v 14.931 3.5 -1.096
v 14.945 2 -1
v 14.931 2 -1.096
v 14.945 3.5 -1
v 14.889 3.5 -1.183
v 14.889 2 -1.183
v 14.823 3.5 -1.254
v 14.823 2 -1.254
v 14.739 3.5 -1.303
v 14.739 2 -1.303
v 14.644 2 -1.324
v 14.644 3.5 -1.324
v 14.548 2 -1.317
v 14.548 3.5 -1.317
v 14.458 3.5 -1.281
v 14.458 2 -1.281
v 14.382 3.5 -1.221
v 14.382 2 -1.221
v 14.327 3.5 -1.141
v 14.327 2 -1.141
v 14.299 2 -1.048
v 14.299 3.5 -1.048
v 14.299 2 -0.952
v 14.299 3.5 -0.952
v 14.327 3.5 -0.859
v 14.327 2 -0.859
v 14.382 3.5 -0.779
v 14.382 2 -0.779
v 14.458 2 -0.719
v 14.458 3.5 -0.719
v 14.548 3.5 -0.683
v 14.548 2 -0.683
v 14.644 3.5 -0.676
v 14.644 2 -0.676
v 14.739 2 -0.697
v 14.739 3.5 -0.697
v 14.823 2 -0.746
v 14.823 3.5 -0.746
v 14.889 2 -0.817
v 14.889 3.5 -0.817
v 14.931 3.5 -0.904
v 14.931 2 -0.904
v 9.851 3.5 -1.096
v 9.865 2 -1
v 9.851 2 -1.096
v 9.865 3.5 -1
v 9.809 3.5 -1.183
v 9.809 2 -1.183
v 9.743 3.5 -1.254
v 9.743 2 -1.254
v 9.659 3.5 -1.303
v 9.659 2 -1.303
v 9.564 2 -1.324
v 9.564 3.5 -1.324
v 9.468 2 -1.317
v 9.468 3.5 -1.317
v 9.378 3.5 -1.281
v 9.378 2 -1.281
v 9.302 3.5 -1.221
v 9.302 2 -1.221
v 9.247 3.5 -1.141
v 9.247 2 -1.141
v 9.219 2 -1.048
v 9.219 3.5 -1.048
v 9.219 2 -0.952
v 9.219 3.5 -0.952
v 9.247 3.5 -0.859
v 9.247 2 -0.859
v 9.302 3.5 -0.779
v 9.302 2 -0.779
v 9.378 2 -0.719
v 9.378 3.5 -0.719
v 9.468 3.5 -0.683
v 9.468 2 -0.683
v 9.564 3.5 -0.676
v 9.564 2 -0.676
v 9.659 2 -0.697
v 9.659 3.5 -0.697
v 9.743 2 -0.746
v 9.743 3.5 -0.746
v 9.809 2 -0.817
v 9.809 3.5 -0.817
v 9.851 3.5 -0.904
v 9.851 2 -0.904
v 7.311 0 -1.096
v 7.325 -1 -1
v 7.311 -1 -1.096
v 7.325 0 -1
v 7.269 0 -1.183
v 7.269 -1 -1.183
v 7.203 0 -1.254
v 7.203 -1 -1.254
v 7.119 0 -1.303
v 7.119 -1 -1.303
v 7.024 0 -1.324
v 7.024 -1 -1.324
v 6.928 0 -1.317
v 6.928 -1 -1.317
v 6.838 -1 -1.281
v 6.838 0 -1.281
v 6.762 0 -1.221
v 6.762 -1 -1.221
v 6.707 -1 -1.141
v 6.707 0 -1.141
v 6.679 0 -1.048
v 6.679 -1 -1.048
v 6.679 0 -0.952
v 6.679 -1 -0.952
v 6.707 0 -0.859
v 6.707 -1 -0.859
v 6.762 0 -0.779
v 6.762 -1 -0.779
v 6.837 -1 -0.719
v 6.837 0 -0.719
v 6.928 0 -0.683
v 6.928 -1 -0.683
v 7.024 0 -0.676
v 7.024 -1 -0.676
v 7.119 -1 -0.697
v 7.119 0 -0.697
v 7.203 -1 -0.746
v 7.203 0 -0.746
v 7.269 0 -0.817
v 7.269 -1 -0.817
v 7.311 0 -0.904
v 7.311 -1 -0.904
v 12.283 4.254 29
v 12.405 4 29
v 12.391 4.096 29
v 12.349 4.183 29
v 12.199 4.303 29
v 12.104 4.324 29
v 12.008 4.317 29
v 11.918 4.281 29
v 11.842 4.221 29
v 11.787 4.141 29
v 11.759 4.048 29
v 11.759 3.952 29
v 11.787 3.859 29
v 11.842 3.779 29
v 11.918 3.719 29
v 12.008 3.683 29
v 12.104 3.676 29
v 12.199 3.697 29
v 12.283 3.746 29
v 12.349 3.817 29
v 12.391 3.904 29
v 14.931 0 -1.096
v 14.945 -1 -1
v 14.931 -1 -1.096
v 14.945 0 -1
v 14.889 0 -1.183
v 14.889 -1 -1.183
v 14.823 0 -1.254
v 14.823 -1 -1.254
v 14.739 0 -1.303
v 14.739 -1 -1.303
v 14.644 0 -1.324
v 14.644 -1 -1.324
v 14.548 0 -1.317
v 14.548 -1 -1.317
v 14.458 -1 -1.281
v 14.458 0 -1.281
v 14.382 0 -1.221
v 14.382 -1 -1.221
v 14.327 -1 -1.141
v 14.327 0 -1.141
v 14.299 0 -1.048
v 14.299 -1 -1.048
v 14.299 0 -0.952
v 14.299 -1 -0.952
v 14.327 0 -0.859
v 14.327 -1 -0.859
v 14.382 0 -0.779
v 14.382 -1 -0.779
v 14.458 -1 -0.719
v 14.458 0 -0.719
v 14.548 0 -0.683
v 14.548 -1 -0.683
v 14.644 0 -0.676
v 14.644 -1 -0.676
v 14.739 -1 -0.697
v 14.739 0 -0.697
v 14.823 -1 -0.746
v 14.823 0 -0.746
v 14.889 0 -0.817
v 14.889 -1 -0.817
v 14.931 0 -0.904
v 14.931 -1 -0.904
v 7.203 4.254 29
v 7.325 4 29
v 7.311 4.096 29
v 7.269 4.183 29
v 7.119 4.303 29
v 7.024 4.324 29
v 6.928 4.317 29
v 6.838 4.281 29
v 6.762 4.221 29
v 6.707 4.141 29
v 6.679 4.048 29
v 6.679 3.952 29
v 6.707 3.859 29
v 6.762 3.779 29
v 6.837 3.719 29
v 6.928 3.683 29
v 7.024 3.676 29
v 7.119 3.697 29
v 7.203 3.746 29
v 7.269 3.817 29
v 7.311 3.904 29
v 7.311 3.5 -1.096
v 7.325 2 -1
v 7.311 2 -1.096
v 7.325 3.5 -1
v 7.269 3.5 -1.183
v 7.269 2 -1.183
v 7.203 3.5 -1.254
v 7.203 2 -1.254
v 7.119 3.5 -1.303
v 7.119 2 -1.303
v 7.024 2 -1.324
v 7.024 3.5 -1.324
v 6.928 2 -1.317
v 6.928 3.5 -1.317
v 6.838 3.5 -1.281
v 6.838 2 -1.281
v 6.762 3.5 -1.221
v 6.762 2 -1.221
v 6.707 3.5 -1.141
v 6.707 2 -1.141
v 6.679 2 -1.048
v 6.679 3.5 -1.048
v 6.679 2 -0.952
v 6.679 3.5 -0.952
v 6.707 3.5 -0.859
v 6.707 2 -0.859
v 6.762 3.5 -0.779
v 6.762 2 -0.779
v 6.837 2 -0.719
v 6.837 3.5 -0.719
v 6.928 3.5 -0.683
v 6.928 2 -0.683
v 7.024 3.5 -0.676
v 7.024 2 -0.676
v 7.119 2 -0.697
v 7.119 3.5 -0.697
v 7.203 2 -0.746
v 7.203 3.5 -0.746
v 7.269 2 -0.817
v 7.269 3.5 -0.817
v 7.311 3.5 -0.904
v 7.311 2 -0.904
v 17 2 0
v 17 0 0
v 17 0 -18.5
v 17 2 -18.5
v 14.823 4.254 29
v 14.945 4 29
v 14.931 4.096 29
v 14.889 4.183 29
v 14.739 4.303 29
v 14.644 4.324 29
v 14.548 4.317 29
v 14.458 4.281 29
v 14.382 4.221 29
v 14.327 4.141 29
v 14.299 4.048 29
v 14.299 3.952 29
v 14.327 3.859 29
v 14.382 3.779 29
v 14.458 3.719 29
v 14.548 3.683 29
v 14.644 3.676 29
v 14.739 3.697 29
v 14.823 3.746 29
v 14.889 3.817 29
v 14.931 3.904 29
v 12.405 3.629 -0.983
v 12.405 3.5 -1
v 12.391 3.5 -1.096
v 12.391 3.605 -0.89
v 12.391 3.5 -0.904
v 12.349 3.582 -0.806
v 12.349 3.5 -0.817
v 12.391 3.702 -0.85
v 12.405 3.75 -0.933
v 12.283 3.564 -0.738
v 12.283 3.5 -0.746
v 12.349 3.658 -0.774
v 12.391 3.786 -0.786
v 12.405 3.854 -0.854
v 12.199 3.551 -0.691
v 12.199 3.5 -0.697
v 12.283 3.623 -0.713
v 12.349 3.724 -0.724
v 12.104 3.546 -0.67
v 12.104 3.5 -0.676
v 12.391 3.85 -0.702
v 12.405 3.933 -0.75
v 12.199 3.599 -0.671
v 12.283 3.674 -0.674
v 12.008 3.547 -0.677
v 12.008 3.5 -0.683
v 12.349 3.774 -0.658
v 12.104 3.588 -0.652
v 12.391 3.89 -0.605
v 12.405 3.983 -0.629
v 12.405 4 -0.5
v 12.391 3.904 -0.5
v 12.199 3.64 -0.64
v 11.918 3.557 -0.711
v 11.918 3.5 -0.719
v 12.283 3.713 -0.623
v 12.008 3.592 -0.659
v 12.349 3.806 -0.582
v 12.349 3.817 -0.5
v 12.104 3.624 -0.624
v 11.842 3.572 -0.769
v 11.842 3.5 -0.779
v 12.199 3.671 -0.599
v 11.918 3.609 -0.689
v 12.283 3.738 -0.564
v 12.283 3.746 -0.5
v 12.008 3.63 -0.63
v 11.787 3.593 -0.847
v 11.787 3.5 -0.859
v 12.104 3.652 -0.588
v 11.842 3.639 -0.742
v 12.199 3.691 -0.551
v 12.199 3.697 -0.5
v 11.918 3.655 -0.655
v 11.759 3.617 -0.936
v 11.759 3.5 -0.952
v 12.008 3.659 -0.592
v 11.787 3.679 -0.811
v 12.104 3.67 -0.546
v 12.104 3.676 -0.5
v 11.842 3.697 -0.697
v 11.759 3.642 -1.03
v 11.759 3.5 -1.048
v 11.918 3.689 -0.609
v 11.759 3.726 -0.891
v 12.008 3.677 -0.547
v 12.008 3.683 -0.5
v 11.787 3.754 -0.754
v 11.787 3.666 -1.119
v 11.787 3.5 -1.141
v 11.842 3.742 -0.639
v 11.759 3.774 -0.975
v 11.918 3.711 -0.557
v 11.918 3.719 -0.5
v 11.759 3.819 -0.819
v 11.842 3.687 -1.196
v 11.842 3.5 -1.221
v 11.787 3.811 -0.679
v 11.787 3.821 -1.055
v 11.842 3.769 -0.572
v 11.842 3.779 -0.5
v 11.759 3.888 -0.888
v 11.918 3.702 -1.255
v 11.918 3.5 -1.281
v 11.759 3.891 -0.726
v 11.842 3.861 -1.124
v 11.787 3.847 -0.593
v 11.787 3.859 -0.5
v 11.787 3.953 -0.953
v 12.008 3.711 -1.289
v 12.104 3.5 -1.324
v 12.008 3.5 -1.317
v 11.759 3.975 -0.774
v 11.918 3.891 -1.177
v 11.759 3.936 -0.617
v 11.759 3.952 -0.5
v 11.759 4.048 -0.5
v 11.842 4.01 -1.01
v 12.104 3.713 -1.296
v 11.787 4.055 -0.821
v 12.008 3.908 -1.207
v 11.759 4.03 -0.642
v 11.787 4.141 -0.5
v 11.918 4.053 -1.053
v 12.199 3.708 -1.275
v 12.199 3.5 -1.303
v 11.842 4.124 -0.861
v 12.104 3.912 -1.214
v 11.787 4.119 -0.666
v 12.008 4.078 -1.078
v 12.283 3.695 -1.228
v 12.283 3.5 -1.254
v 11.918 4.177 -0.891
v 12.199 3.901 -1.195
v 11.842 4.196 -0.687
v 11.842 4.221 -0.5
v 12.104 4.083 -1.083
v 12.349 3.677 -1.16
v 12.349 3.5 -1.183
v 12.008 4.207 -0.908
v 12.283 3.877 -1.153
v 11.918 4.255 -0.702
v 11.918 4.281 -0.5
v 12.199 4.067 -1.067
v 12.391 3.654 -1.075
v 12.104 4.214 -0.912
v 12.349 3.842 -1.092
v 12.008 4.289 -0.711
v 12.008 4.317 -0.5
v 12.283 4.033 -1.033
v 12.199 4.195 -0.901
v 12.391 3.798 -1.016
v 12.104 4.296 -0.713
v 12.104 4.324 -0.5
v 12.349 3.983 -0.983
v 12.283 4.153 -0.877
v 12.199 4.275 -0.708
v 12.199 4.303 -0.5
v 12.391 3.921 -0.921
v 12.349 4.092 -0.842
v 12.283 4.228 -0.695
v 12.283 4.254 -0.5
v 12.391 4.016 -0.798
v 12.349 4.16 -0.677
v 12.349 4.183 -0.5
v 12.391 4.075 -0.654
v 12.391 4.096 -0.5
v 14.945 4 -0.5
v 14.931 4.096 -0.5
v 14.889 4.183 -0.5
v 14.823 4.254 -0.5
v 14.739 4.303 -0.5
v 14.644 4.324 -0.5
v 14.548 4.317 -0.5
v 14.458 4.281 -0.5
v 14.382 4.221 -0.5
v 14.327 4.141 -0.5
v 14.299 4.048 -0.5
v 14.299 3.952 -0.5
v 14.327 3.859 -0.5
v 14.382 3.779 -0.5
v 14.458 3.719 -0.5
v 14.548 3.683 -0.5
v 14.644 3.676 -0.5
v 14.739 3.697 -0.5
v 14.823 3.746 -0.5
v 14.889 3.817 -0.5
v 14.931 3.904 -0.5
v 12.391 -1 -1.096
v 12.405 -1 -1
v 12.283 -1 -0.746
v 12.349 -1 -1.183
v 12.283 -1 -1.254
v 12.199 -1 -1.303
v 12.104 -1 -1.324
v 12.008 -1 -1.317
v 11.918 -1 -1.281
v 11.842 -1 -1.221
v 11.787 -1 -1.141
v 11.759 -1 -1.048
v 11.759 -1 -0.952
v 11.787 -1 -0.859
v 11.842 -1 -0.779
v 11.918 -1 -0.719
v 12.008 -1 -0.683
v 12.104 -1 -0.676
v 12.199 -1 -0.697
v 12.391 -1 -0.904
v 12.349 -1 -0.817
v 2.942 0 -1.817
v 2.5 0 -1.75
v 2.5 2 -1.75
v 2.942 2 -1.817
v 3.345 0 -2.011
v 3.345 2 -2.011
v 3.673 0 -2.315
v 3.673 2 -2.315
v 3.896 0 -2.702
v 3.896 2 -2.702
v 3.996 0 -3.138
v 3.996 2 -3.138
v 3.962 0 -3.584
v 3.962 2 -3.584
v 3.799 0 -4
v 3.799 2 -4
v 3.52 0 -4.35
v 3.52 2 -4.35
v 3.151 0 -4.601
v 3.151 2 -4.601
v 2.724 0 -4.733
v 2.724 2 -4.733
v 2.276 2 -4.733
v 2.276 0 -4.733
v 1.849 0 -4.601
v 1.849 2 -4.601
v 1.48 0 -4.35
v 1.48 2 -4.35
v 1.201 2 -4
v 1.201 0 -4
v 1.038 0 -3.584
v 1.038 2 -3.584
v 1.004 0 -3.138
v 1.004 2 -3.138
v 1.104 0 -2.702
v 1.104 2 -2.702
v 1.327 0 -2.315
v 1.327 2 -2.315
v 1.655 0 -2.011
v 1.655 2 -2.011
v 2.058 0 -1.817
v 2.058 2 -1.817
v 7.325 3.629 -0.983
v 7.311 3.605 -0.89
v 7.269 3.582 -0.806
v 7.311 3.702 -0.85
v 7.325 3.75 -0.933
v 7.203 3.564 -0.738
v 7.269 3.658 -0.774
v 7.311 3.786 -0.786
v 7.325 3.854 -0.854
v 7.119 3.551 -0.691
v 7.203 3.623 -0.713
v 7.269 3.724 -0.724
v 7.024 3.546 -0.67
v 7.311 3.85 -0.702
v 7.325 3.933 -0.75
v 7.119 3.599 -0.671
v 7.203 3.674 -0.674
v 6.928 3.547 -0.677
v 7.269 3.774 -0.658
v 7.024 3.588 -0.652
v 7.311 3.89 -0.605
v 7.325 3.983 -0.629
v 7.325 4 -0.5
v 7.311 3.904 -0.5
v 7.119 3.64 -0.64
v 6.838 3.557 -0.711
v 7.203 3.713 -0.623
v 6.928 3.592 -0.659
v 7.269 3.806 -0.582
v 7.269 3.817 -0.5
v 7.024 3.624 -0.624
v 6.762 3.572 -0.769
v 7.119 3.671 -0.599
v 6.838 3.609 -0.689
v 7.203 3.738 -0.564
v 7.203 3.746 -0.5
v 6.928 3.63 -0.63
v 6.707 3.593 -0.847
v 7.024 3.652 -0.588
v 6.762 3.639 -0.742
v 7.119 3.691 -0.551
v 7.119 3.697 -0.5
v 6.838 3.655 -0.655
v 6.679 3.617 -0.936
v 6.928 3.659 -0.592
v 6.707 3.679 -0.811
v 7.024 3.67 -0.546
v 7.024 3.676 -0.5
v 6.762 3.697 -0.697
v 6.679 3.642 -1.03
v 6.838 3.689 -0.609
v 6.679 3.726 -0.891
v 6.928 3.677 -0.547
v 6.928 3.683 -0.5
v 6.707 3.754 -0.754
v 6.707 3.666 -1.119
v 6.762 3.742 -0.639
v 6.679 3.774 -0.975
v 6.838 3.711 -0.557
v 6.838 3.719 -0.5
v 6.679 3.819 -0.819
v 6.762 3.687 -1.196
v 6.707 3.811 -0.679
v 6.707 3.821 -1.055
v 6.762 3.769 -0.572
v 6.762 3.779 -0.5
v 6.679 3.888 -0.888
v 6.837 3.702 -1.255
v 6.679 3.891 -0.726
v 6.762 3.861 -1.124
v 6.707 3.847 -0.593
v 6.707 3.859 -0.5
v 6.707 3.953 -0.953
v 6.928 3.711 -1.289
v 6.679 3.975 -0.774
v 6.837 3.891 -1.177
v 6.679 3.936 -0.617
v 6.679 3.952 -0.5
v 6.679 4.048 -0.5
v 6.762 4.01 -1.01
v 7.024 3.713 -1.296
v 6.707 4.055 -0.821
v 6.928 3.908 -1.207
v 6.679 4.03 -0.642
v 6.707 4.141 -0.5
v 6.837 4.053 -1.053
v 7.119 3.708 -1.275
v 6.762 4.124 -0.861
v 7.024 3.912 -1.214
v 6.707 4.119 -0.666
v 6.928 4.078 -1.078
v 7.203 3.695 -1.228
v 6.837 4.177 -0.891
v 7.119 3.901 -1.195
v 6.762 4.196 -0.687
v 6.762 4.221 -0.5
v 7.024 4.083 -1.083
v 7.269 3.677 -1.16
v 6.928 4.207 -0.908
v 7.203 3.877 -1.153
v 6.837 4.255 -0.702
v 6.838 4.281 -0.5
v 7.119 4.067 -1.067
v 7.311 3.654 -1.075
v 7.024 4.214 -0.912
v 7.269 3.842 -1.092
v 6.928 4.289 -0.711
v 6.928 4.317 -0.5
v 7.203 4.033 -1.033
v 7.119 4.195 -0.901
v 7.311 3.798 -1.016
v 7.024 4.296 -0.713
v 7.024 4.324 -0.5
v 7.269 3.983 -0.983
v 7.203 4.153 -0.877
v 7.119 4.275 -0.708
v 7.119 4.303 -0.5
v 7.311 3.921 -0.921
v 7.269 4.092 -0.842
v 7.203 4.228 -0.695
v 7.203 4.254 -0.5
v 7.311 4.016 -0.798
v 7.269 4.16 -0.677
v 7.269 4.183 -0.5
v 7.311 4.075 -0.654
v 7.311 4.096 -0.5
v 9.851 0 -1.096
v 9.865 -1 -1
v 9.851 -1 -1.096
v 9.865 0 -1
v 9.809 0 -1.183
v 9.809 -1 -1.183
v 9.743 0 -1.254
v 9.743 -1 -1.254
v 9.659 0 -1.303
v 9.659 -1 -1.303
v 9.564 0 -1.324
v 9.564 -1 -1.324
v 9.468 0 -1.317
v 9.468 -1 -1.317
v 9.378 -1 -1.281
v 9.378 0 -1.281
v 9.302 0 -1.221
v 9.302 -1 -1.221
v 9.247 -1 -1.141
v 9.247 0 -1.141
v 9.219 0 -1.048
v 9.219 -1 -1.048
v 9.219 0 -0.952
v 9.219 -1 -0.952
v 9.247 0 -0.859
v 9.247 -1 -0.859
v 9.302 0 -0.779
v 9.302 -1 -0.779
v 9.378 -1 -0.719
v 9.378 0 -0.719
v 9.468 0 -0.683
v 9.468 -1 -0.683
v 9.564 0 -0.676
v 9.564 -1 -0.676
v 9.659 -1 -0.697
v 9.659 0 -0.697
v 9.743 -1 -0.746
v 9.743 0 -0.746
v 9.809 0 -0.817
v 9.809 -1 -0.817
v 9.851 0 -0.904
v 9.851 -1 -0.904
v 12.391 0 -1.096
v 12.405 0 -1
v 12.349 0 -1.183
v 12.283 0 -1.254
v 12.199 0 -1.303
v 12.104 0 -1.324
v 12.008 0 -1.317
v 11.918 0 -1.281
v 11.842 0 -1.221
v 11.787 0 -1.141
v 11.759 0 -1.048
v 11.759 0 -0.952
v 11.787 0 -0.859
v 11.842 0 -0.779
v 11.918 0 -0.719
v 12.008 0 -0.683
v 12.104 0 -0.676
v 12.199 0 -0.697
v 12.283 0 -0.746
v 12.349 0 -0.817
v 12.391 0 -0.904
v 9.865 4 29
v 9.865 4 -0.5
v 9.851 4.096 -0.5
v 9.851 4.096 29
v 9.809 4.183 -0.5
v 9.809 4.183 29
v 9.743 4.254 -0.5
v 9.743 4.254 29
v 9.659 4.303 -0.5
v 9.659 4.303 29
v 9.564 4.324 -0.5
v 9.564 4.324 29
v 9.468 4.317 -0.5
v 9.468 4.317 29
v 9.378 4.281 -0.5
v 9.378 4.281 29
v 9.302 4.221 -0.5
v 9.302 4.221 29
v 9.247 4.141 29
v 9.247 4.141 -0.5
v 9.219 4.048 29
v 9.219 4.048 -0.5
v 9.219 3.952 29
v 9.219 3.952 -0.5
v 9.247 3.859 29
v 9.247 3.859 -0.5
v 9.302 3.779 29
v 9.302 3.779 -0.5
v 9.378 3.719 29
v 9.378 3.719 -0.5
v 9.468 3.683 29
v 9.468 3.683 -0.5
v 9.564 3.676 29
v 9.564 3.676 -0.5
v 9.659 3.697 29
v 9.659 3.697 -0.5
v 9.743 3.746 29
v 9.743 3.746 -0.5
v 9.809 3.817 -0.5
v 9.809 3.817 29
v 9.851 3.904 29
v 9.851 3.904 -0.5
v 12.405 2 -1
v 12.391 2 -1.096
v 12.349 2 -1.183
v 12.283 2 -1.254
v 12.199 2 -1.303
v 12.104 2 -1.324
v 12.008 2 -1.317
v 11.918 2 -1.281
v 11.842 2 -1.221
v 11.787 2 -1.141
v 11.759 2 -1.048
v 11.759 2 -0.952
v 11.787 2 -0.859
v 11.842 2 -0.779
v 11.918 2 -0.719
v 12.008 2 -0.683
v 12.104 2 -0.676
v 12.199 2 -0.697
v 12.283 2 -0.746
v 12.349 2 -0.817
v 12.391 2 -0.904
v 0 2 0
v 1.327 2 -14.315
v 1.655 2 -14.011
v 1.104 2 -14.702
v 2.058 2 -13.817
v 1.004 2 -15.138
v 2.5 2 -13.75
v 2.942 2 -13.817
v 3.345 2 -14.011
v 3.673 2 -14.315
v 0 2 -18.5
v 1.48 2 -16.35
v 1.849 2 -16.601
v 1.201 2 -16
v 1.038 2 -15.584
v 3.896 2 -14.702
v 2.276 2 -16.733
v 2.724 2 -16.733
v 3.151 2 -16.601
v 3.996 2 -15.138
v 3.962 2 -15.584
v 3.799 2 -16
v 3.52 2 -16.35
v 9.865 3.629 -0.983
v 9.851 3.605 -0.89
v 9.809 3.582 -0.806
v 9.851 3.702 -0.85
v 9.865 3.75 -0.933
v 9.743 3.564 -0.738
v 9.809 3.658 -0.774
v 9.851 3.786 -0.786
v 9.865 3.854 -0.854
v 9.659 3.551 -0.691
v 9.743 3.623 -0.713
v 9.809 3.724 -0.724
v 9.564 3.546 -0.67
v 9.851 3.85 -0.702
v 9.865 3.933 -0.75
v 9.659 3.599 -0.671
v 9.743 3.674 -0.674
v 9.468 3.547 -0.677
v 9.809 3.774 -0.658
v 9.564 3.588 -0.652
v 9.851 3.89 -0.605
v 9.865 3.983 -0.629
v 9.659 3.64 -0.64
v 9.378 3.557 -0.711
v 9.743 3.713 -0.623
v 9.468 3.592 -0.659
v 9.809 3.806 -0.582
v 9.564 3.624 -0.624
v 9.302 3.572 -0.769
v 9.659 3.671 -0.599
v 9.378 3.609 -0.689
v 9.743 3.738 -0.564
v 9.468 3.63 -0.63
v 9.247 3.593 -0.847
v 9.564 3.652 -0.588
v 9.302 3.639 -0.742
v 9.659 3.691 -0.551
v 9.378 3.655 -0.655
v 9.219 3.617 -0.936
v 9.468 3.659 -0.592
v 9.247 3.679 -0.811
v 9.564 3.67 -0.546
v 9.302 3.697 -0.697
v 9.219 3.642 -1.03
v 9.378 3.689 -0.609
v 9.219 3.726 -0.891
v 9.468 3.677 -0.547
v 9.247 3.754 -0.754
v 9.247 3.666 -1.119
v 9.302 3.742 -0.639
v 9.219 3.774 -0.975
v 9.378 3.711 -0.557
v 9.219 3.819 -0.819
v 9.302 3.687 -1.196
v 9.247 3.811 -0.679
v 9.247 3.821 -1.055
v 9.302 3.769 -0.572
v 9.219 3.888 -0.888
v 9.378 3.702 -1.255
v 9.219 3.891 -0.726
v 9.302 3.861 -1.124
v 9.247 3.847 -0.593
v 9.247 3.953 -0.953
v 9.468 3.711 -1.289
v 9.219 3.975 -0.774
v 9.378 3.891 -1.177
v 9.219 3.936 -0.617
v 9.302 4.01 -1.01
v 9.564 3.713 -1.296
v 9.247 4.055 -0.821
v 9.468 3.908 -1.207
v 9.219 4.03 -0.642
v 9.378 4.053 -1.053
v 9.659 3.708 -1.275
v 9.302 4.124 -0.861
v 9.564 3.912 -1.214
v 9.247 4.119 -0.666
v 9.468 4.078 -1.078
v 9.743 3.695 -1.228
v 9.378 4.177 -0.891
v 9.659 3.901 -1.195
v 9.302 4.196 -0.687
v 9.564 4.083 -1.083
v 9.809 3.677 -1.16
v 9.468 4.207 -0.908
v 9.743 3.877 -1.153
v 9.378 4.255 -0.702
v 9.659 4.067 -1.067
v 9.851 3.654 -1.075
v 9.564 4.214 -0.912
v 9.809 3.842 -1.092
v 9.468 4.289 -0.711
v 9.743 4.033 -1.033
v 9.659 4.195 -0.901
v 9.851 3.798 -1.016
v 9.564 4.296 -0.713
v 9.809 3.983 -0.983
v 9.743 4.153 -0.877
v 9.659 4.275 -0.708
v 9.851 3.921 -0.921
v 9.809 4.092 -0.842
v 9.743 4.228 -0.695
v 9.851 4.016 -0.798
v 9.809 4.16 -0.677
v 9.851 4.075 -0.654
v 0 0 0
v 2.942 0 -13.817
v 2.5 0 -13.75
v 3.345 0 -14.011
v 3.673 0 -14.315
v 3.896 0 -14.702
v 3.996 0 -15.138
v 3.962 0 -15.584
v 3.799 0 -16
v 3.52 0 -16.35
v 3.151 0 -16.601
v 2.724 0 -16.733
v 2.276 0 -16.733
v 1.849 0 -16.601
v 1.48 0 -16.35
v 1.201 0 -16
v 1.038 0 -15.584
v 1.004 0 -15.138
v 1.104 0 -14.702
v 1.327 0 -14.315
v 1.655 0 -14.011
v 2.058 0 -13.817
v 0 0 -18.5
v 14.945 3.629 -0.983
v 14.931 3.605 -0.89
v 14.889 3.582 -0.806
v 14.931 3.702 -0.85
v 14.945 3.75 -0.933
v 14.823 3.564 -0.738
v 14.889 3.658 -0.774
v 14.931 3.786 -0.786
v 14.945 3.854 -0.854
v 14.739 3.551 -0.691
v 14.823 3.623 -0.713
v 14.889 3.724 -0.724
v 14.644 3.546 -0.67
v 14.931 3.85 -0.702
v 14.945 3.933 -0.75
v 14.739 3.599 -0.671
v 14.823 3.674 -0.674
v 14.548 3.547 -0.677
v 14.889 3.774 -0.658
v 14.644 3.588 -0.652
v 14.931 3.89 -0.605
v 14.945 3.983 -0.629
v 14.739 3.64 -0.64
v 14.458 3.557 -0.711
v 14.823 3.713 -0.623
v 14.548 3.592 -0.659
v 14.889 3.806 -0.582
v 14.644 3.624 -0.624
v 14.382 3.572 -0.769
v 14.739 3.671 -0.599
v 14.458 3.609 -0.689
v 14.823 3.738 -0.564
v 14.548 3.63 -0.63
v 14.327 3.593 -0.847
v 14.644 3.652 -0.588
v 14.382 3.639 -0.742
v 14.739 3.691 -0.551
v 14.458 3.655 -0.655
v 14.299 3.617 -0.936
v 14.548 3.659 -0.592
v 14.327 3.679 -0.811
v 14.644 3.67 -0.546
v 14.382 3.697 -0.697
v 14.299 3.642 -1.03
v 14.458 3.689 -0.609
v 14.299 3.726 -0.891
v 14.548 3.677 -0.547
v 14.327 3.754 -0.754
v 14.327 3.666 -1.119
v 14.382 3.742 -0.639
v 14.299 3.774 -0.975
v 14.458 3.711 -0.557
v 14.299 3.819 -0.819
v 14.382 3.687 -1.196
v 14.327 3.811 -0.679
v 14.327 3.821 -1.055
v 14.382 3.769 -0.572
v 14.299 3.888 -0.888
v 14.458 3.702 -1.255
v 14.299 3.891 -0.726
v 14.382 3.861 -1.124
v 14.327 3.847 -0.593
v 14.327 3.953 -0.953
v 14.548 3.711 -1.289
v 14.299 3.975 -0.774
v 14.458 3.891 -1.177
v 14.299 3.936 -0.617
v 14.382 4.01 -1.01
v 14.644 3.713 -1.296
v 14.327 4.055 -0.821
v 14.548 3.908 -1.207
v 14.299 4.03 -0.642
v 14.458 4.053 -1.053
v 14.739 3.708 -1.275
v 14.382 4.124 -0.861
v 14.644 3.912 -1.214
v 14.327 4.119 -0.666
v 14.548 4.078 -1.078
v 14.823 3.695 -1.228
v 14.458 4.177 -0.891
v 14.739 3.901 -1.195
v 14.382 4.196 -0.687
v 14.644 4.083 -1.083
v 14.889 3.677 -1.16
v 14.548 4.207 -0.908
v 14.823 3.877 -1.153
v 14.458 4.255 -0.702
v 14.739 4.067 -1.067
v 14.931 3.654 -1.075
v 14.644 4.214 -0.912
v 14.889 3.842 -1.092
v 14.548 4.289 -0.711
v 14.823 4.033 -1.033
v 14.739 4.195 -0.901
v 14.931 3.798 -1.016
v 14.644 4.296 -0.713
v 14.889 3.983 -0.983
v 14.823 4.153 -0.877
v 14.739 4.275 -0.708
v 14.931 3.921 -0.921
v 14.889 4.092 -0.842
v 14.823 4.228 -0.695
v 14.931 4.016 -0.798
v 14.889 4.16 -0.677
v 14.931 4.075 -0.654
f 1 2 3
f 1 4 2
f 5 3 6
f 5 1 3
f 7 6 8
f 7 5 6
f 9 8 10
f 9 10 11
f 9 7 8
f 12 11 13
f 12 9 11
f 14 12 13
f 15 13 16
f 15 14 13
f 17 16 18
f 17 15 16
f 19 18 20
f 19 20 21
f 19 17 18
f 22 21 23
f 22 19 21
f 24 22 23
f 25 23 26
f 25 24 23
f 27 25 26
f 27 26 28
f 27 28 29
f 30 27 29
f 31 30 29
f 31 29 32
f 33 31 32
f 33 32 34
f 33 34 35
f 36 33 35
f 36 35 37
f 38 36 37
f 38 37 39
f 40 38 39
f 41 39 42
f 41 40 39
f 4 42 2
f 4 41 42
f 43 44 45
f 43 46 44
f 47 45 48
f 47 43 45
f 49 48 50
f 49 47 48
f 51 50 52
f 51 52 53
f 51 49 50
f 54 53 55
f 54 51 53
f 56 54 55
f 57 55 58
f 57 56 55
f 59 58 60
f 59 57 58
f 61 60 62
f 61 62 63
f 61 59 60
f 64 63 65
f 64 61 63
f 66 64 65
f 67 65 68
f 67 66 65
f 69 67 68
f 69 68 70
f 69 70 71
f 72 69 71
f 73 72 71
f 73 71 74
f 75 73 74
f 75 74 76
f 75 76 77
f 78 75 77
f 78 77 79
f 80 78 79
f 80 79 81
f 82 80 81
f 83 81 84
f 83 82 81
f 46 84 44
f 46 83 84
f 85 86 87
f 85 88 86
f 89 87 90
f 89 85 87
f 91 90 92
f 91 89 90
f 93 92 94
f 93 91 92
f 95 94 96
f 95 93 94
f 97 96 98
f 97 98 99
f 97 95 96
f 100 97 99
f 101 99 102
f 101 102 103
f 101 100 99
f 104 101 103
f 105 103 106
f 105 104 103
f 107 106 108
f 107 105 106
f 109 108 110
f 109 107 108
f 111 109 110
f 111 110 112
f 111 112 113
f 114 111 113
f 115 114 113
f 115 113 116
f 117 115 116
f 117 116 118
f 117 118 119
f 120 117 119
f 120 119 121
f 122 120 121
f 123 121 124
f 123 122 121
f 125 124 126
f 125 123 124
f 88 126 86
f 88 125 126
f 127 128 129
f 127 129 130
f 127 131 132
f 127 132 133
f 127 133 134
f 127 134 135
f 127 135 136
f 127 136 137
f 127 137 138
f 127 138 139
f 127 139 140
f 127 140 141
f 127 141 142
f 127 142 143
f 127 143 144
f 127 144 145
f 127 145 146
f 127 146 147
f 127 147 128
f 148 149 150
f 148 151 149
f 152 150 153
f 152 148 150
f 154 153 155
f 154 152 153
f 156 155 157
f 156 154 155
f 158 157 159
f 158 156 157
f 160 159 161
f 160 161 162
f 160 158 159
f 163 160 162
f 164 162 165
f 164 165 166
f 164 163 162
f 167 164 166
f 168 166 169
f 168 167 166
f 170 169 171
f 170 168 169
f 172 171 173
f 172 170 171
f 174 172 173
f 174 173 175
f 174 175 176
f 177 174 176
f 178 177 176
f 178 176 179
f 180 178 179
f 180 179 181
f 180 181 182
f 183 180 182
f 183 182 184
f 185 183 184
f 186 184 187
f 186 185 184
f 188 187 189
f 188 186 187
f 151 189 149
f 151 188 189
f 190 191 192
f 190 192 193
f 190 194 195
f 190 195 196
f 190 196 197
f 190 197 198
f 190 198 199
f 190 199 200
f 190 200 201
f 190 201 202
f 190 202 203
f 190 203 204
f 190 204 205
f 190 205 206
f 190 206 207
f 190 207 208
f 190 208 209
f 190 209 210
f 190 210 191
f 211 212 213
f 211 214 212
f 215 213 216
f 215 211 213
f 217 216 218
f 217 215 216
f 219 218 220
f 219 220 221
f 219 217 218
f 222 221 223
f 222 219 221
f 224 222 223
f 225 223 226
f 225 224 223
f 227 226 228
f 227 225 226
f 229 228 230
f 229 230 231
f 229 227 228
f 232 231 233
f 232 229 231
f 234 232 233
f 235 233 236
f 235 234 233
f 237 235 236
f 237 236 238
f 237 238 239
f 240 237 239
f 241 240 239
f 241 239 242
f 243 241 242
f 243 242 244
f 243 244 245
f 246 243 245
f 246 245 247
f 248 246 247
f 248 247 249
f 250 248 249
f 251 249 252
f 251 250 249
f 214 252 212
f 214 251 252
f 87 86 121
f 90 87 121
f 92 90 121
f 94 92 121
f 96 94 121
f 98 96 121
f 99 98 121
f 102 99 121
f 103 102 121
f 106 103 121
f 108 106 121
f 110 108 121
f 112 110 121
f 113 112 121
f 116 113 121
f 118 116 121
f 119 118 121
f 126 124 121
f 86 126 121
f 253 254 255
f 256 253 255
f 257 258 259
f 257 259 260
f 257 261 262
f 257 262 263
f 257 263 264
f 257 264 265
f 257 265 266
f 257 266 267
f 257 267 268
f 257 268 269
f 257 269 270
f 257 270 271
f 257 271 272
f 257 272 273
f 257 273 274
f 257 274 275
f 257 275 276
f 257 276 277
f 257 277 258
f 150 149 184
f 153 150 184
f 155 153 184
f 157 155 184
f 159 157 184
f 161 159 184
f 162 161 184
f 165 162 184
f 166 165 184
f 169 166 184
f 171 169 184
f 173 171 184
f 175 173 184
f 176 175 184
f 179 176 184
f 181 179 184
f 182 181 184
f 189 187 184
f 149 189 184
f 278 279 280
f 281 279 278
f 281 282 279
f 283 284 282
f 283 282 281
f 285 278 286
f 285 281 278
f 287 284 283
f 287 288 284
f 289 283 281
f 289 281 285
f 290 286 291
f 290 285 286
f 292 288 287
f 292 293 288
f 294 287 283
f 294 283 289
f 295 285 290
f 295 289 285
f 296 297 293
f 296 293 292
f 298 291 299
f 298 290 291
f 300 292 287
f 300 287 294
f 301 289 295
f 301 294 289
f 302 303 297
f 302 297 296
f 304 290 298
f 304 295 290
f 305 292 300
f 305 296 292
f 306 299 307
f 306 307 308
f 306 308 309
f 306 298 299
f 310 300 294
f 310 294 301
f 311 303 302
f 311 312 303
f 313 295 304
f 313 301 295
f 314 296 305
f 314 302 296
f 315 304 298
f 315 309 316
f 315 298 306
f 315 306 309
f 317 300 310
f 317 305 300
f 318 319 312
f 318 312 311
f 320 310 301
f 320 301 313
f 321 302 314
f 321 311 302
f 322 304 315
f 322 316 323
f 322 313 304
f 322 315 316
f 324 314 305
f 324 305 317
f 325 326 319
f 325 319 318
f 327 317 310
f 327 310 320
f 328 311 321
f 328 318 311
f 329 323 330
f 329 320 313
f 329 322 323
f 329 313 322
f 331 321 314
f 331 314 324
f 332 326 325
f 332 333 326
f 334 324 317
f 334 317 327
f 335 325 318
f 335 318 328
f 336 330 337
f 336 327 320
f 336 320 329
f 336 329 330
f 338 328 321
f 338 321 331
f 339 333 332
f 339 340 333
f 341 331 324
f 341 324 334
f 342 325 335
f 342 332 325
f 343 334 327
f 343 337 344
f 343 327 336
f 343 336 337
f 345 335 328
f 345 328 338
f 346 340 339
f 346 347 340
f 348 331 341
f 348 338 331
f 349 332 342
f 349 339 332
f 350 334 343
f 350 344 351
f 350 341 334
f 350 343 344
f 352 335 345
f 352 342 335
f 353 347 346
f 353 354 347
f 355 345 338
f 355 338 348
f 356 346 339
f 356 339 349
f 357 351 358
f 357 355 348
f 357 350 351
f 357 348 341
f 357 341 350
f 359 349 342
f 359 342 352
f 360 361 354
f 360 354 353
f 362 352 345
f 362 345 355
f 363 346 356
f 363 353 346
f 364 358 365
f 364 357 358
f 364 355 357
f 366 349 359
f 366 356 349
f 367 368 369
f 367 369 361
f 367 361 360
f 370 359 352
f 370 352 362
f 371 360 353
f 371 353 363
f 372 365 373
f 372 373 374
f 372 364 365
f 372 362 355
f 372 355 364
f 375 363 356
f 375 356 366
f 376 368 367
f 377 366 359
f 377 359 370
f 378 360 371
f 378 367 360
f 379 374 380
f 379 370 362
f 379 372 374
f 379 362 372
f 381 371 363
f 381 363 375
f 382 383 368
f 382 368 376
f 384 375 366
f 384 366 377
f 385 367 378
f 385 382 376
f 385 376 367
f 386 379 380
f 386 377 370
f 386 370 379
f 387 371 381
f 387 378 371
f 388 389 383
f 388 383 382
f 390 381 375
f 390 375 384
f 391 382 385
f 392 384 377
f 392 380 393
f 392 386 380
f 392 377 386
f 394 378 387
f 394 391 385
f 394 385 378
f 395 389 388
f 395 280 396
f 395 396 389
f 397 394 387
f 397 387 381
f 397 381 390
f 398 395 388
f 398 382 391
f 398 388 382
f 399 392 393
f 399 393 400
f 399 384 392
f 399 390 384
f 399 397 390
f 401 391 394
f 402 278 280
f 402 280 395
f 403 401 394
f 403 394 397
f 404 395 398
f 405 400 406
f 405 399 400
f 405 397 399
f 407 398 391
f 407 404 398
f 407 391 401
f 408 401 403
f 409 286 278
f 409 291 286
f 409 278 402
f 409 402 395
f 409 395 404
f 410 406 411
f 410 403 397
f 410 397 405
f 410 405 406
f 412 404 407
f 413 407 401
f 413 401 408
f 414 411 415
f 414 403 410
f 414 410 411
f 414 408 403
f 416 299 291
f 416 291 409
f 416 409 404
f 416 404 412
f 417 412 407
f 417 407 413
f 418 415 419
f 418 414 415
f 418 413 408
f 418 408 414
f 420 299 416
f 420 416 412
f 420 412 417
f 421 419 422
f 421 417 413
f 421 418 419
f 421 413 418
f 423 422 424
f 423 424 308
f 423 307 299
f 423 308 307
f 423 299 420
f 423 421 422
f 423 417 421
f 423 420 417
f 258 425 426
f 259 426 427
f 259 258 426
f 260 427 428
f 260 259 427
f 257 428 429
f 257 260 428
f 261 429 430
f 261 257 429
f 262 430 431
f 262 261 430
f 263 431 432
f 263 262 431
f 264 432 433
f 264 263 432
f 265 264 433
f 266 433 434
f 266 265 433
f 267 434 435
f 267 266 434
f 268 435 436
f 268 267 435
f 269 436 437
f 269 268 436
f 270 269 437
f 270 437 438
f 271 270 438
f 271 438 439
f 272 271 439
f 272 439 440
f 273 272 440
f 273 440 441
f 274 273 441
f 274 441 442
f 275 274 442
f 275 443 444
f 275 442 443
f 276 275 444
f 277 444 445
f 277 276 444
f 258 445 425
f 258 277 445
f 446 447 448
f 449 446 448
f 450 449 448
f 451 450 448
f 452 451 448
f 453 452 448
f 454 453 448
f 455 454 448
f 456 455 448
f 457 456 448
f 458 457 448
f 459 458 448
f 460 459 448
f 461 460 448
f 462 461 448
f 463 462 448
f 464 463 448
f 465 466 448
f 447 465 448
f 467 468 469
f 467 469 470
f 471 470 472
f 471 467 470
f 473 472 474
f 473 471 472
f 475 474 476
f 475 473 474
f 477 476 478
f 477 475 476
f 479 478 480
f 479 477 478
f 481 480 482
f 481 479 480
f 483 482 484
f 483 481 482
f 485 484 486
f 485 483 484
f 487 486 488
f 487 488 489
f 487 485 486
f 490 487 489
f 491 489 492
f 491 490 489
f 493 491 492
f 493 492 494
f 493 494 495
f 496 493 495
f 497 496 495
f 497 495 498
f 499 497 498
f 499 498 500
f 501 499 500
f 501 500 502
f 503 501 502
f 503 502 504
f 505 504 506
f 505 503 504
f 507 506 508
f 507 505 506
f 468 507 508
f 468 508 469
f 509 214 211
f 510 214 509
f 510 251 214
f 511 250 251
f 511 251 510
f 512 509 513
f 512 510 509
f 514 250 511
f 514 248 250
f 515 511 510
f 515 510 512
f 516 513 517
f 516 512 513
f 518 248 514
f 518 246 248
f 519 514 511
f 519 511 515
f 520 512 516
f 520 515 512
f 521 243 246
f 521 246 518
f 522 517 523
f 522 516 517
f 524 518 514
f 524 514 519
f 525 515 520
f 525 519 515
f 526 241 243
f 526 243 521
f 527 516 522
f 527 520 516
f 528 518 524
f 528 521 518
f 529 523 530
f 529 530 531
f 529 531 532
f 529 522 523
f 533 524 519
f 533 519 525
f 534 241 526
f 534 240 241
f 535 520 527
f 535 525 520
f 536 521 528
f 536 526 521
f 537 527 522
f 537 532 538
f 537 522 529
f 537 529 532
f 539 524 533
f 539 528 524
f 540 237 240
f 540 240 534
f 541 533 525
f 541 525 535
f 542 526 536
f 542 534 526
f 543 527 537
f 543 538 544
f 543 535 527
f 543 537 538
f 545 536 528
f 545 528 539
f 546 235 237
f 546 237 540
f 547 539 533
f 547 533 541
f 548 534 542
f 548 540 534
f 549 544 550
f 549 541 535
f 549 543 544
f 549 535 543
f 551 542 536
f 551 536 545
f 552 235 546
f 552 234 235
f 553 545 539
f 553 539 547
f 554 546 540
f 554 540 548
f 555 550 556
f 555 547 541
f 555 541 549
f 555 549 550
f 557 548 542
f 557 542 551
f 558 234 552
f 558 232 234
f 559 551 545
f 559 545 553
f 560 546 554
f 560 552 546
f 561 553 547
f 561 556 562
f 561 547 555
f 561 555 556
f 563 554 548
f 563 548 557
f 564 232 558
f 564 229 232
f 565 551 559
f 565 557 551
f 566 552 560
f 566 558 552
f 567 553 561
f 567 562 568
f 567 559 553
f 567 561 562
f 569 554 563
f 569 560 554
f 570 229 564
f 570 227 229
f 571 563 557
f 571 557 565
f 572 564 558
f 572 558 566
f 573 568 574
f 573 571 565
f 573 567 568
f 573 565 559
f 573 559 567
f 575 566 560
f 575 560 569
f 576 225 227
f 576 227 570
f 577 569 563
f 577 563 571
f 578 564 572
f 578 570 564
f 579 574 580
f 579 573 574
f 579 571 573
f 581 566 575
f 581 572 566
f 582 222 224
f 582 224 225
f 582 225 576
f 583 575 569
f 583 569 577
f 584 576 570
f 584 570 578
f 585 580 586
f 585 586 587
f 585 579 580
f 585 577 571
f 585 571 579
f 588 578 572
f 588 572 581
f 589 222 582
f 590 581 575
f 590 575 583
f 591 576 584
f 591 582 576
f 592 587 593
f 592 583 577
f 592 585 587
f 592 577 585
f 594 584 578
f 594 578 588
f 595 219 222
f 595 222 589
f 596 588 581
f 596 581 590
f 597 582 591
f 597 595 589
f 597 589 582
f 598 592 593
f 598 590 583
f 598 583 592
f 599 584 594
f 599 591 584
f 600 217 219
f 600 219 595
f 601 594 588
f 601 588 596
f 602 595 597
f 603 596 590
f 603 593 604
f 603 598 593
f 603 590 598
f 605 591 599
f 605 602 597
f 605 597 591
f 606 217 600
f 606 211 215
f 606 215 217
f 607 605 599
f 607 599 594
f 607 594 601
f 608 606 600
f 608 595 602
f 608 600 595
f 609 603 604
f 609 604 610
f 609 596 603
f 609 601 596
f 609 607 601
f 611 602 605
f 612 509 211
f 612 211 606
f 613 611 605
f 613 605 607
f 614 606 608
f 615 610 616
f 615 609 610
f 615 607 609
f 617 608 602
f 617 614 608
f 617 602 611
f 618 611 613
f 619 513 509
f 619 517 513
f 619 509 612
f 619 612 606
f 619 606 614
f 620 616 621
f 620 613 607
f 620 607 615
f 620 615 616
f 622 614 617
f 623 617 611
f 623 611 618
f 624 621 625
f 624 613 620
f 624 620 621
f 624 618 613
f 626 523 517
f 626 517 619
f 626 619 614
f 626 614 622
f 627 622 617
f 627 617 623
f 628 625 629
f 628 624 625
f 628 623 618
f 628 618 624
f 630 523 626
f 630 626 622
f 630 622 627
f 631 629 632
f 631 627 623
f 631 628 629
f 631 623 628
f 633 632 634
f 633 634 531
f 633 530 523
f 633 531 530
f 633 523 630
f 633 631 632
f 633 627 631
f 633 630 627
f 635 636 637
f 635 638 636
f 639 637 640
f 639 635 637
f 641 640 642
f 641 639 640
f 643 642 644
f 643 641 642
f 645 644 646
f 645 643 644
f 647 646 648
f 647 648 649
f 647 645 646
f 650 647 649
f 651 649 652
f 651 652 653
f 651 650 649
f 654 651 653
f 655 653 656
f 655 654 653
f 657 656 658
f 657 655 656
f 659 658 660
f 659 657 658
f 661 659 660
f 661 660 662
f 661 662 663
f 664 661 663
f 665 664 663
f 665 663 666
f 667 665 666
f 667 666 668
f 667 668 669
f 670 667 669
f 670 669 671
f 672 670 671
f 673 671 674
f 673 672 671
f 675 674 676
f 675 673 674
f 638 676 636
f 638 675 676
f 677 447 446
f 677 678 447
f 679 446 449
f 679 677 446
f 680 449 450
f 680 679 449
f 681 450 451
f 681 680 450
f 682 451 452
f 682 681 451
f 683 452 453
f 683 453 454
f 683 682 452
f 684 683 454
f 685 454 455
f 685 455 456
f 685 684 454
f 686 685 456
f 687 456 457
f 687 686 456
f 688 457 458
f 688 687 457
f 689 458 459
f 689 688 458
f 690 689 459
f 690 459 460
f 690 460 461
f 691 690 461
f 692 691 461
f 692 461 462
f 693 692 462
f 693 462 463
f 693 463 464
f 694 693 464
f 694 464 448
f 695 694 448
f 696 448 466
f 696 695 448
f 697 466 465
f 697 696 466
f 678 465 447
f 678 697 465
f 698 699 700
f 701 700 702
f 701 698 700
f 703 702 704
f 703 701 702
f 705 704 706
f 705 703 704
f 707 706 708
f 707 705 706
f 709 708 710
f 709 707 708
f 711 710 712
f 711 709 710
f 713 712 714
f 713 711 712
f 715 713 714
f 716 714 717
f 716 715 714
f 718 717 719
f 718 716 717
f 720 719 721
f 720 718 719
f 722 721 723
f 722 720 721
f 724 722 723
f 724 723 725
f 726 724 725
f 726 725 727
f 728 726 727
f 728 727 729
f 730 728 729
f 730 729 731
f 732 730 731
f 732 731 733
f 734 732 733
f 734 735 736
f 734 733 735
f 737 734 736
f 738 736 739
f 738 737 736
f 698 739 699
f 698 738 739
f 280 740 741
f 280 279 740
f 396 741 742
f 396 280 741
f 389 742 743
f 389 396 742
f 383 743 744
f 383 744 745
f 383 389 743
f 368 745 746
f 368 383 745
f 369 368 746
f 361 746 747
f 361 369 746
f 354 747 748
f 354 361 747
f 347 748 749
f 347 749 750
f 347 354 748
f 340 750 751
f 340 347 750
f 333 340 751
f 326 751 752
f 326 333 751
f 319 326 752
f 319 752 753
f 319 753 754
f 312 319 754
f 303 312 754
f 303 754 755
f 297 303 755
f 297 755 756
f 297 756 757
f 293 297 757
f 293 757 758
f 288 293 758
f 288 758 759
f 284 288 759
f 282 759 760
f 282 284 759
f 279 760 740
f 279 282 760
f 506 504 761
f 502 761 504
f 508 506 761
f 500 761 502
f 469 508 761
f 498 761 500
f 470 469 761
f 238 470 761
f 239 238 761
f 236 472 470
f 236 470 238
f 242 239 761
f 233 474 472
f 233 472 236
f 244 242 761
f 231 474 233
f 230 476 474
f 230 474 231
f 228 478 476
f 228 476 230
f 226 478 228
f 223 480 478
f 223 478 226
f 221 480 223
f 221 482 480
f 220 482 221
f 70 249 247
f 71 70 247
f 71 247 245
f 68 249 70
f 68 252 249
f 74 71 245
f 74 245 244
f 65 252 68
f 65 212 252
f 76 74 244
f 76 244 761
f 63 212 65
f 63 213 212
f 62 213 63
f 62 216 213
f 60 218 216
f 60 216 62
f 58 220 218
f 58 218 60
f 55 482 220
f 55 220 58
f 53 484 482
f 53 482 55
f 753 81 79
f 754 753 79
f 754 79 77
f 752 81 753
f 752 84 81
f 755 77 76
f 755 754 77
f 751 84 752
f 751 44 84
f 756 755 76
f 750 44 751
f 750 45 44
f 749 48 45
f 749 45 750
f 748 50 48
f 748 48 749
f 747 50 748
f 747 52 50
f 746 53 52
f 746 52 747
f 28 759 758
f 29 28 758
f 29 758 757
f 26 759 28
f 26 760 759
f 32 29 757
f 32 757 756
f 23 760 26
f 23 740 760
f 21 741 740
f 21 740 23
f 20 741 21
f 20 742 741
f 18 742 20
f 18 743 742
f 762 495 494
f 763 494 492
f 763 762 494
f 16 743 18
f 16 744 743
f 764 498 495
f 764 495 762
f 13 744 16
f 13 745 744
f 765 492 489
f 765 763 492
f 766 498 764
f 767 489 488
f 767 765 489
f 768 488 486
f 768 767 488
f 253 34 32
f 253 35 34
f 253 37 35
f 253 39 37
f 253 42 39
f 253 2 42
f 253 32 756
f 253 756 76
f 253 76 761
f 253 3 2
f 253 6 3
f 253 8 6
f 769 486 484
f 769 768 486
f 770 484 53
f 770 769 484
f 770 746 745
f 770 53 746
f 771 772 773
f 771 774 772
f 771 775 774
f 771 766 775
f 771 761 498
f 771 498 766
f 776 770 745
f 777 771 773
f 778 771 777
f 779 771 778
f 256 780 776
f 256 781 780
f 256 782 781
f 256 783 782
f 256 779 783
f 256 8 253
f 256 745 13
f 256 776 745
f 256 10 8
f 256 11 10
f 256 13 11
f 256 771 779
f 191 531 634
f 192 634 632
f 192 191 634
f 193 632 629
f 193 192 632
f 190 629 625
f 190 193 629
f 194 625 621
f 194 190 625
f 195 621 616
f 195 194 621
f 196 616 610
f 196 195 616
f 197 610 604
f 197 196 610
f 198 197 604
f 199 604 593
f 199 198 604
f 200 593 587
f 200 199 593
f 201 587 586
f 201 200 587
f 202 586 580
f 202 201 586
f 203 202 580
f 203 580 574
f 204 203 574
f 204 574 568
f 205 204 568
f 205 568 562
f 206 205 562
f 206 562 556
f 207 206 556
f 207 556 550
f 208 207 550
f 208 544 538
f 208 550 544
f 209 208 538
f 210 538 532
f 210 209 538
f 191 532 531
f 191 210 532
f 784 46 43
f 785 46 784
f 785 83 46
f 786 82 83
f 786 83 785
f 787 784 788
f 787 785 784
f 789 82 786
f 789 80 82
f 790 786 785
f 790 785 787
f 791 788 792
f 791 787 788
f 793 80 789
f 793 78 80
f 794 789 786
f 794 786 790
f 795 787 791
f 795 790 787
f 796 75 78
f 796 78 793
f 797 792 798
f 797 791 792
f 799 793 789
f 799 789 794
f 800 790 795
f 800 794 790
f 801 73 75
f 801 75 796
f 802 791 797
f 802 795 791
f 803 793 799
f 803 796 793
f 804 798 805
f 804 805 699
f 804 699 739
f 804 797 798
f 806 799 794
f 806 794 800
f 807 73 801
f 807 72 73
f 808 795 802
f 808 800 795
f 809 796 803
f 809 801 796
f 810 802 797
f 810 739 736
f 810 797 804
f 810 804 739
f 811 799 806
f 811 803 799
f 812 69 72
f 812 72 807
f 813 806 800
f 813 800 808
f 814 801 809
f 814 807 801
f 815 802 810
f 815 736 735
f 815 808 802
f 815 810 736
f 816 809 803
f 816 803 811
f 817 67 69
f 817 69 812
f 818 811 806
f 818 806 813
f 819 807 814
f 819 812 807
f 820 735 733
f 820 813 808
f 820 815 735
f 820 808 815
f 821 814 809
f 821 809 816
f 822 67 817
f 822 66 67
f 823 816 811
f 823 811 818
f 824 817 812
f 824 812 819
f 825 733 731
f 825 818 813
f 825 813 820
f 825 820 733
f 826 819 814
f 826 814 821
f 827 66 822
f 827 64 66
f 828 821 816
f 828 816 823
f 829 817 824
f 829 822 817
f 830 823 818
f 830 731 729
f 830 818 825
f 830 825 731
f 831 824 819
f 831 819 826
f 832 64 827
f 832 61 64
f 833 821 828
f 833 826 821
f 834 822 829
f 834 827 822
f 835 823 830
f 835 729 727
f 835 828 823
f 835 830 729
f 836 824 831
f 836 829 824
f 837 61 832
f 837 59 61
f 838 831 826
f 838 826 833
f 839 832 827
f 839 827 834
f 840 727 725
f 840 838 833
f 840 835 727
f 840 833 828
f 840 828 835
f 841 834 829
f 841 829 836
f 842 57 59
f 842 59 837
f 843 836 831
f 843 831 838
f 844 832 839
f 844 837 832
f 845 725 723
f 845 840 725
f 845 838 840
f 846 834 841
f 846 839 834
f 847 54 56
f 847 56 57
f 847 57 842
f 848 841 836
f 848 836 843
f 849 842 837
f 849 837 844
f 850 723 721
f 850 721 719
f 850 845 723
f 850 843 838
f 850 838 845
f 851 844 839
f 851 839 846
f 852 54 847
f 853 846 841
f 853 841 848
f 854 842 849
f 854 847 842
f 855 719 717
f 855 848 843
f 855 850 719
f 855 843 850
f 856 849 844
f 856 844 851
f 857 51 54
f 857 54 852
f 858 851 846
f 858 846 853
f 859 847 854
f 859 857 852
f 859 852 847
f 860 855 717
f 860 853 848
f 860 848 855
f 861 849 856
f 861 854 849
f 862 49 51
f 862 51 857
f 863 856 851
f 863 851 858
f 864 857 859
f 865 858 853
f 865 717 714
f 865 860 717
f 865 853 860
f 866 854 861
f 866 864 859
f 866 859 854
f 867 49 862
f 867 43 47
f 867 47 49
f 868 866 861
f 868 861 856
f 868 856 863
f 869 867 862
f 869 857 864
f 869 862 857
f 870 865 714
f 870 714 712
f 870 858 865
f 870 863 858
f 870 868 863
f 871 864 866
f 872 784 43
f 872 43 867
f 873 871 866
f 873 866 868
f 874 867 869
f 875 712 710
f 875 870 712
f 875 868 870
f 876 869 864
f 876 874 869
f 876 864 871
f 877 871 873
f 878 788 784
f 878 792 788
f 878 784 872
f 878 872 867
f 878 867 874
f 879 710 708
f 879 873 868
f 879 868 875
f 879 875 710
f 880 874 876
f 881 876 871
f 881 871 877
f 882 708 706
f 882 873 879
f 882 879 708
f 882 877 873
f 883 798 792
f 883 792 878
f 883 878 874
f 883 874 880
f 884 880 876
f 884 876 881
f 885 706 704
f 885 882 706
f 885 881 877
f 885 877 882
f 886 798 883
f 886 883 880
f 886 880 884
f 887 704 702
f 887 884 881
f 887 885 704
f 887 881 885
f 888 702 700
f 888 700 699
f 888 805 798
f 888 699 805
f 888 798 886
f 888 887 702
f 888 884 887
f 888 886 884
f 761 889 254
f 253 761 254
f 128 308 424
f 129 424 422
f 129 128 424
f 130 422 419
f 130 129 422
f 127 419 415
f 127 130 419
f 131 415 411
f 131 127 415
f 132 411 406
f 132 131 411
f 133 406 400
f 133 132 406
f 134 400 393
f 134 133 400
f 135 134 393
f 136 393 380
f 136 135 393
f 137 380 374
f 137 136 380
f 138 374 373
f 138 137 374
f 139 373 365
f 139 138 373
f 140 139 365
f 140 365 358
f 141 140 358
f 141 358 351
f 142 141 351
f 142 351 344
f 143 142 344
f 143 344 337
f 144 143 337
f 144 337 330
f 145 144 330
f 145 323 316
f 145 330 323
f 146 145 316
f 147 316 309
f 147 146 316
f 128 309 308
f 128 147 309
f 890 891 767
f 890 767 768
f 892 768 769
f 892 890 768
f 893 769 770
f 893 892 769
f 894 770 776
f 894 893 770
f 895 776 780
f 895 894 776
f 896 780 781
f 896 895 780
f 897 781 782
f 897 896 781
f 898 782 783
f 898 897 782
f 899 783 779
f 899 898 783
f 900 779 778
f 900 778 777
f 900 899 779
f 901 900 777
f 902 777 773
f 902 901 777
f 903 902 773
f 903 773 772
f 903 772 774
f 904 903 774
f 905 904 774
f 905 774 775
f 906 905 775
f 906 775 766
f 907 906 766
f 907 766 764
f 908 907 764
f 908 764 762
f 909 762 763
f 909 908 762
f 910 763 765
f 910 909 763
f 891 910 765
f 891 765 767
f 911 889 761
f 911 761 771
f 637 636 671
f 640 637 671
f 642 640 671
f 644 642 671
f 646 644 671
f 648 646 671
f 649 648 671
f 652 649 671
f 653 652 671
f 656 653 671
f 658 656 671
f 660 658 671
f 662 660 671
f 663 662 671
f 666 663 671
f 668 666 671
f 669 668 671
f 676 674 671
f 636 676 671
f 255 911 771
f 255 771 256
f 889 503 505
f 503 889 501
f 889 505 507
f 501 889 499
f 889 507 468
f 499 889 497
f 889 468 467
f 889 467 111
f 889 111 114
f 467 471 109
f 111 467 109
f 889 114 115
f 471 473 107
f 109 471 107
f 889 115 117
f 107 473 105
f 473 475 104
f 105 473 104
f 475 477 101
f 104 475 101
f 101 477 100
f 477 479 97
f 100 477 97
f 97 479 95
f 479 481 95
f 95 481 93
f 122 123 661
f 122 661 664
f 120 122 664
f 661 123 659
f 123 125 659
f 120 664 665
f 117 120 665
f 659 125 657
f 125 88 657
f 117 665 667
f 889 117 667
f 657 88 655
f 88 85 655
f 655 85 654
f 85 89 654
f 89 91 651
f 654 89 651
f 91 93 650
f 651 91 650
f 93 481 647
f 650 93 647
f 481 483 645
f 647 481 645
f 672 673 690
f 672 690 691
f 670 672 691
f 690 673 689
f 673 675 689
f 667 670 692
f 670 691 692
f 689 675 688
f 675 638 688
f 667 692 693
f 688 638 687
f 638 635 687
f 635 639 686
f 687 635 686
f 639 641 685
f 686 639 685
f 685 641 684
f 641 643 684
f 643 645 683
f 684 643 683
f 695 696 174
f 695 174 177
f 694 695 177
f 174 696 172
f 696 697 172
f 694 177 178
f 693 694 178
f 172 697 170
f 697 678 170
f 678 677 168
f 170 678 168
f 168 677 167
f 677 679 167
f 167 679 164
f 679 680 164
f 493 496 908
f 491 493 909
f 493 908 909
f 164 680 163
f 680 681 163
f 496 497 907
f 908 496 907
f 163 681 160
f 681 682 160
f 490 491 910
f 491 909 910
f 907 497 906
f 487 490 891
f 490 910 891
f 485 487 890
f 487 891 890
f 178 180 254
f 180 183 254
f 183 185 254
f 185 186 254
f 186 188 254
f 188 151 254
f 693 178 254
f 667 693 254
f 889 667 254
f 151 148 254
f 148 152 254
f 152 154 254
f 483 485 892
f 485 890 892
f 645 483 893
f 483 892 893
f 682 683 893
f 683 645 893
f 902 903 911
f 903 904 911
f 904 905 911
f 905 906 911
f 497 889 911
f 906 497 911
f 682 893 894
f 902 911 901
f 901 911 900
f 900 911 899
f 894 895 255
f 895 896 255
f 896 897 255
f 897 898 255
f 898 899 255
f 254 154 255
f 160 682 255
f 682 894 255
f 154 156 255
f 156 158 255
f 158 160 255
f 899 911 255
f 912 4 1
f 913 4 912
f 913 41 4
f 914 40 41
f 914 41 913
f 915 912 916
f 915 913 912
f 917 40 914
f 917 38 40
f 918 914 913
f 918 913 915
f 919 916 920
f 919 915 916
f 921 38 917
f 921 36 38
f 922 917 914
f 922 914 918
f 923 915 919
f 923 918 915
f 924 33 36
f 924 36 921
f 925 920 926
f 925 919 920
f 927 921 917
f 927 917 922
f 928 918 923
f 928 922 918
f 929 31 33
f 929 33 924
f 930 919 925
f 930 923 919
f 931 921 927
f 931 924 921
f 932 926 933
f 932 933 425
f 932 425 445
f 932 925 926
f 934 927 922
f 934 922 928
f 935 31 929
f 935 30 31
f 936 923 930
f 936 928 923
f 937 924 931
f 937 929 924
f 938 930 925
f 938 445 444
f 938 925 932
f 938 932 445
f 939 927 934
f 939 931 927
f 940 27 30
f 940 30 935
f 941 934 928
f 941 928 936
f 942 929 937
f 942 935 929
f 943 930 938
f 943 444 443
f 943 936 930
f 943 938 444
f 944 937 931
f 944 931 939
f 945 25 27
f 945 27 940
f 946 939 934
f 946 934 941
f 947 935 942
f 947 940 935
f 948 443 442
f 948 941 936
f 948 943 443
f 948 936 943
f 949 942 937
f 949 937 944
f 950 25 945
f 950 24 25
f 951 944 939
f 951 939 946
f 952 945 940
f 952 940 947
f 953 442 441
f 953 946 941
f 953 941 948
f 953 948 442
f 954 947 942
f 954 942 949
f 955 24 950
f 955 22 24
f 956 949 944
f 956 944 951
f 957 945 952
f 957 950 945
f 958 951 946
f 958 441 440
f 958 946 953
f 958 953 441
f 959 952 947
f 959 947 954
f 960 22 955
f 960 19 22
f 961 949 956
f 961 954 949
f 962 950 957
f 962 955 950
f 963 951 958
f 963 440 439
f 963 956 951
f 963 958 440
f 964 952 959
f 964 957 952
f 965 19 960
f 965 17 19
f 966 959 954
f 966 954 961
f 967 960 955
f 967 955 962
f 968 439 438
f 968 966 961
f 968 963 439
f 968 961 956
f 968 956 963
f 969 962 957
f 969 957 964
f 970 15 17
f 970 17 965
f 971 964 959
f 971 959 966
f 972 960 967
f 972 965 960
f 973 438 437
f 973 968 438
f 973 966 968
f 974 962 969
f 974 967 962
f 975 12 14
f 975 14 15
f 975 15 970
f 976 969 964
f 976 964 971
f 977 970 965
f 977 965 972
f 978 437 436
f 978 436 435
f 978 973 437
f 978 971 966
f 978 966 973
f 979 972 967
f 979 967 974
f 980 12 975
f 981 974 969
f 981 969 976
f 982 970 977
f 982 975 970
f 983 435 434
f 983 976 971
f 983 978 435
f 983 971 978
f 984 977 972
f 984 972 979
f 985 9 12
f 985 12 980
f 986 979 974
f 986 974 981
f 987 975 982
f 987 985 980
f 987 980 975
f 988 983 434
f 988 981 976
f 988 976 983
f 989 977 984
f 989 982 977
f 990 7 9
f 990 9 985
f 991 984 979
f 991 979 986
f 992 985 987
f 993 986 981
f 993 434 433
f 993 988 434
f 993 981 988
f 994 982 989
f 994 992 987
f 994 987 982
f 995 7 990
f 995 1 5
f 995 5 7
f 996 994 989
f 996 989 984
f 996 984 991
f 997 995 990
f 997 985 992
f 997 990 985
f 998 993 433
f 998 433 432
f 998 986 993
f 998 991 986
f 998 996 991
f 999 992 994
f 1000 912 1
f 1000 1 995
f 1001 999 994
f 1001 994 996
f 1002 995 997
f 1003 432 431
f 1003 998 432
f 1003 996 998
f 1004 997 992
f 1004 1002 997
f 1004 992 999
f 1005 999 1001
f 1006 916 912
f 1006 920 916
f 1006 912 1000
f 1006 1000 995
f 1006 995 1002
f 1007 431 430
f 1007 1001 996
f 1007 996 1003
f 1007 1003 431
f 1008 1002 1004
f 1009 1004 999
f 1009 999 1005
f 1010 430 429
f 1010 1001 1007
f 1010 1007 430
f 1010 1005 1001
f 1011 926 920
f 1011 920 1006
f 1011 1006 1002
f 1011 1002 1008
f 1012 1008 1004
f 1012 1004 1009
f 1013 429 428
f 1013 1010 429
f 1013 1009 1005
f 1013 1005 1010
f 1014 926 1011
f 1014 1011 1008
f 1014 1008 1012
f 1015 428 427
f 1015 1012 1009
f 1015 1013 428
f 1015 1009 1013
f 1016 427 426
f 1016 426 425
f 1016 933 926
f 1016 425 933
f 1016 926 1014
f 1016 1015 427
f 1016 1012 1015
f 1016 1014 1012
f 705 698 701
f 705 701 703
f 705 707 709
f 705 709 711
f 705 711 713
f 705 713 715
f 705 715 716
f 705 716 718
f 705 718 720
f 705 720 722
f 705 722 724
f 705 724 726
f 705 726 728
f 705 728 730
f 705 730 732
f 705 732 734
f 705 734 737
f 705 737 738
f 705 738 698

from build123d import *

# Parameters (mm, degrees)
SKETCH1_W           = 17
SKETCH1_H           = 18.5
SKETCH1_R           = 1.5
BOSS_EXTRUDE1_DEPTH = 2
SKETCH3_R           = 0.325
LPATTERN1_COUNT     = 4
LPATTERN1_PITCH     = 2.54


with BuildPart() as part:
    # Sketch1 → Boss-Extrude1 (new body)
    with BuildSketch(Plane(origin=(0, 0, 0), x_dir=(1, 0, 0), z_dir=(0, 1, 0))):
        with Locations((8.5, 9.25)):
            Rectangle(SKETCH1_W, SKETCH1_H)
        with Locations(Location((2.5, 15.25, 0), (0, 0, 270))):
            Circle(SKETCH1_R, mode=Mode.SUBTRACT)
        with Locations(Location((2.5, 3.25, 0), (0, 0, 270))):
            Circle(SKETCH1_R, mode=Mode.SUBTRACT)
    extrude(amount=BOSS_EXTRUDE1_DEPTH)

    # Sweep1: sweep along a path in Sketch2
    with BuildLine(Plane.ZY.offset(-7)) as sweep1_path:
        Line((-1, -1), (-1, 3.5))
        ThreePointArc((-1, 3.5), (-0.853553391, 3.853553391), (-0.5, 4))
        Line((-0.5, 4), (29, 4))
    # Sketch3 → Sweep1 (sweep)
    with BuildSketch(Plane(origin=(0, 2, 0), x_dir=(1, 0, 0), z_dir=(0, 1, 0))):
        with Locations((7, 1)):
            Circle(SKETCH3_R)
    sweep1 = sweep(path=sweep1_path.line)

    # LPattern1: Sweep1 ×4
    with Locations(*[(i * LPATTERN1_PITCH, 0, 0) for i in range(1, LPATTERN1_COUNT)]):
        add(sweep1)


solid = part.part
